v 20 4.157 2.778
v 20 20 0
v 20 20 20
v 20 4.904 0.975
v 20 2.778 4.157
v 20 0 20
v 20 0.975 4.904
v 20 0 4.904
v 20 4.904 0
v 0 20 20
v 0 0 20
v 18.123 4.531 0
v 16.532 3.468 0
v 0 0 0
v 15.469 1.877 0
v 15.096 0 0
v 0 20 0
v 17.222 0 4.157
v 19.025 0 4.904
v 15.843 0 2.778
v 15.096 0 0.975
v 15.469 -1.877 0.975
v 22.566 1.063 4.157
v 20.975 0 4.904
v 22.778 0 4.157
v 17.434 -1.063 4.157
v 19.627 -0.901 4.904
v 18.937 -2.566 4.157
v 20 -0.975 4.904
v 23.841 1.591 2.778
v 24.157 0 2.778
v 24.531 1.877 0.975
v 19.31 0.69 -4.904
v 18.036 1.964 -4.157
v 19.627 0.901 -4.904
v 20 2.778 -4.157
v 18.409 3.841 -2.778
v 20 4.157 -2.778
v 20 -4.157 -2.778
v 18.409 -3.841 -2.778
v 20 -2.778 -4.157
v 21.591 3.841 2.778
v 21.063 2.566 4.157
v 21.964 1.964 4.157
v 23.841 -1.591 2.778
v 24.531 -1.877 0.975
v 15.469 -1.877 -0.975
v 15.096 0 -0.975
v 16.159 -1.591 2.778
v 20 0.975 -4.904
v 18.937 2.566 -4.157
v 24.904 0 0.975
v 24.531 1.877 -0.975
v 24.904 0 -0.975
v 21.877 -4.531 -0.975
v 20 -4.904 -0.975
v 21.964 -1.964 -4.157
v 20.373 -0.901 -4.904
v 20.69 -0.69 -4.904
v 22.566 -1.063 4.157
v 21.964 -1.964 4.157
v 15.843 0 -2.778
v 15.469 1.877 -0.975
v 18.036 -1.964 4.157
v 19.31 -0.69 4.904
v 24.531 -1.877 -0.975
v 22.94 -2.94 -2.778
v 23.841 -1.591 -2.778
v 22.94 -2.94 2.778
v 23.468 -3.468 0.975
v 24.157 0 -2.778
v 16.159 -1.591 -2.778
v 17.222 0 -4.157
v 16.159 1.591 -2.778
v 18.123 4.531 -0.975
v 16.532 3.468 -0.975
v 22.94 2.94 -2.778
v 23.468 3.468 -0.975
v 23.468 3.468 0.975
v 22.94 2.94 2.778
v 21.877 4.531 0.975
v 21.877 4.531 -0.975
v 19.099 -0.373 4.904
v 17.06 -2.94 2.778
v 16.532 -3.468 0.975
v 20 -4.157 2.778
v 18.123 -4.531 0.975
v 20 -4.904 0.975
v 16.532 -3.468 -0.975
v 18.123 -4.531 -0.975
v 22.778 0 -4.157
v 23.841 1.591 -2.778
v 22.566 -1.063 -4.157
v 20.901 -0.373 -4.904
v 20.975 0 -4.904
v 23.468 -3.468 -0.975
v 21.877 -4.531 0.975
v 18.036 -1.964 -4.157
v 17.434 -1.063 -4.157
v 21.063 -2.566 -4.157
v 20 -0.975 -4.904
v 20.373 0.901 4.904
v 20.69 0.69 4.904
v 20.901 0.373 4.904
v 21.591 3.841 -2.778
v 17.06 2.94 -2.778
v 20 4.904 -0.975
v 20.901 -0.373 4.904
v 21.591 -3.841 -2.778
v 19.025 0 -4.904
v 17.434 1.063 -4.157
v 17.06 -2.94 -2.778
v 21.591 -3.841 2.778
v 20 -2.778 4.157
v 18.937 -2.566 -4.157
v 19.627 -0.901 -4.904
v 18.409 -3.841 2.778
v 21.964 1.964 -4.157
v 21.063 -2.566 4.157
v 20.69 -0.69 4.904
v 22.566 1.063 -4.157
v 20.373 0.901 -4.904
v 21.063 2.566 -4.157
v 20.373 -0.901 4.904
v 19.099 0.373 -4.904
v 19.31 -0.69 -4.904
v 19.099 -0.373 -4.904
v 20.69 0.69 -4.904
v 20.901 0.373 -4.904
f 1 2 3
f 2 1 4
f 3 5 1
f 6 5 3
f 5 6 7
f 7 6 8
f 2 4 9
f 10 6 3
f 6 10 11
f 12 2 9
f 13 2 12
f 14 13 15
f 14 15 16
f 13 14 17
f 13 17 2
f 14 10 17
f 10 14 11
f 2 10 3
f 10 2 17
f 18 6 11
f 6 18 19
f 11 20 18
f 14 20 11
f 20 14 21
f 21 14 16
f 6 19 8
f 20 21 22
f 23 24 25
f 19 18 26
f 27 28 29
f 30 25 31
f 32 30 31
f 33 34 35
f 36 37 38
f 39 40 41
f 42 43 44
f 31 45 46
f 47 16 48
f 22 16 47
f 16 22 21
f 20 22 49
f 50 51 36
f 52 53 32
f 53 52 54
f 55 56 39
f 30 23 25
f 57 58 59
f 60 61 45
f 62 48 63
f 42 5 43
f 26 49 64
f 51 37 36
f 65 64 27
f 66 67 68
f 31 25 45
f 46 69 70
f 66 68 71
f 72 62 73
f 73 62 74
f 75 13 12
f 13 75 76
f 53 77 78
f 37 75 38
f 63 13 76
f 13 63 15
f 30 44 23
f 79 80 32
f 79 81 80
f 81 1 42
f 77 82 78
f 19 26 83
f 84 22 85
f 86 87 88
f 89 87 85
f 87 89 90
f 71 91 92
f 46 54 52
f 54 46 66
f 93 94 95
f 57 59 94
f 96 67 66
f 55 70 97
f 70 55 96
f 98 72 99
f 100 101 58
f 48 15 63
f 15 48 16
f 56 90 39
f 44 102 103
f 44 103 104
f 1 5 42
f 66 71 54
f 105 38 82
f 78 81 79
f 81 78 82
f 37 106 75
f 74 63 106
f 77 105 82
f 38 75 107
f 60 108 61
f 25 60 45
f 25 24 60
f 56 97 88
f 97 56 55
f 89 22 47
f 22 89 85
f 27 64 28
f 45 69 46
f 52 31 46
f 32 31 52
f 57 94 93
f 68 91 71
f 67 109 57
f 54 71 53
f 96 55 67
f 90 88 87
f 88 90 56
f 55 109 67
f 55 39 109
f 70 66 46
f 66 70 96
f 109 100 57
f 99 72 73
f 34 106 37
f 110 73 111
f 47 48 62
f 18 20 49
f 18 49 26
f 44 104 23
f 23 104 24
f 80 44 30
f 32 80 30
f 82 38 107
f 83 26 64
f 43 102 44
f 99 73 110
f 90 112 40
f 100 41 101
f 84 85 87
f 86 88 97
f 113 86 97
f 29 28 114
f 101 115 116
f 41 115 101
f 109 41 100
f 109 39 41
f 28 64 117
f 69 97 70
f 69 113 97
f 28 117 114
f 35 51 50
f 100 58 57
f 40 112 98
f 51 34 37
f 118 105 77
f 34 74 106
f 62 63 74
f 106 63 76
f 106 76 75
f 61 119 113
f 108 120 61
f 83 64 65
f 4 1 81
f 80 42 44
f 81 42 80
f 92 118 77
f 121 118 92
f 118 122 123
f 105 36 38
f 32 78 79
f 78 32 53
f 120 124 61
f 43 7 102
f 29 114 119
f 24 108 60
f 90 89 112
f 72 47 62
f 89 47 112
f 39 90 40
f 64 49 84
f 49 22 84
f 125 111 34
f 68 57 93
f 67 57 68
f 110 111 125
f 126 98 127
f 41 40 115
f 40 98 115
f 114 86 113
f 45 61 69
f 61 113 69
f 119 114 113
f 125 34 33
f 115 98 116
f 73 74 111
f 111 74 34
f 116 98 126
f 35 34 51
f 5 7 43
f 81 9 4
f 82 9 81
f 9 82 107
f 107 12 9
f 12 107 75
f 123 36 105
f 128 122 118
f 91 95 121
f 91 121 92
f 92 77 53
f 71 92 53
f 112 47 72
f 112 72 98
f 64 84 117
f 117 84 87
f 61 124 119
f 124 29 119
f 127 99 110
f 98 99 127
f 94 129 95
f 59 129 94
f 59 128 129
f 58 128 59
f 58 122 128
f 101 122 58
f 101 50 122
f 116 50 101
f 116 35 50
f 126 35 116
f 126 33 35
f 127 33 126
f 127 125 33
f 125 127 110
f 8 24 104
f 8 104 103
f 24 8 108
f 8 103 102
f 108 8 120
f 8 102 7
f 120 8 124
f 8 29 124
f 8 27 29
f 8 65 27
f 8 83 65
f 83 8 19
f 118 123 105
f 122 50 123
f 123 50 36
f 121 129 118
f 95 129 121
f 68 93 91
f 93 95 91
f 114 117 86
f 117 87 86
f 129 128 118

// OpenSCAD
// Issue #100 — the reported multi-part SCAD (live repro: "Create a 20mm
// cube with a 10mm sphere sitting next to it"). The failures.jsonl archive
// line for this request carried an empty output_scad (the archive
// pre-dated the loop's SCAD capture), so this fixture IS the reported SCAD:
// the parametric W/D/H block the design prompt mandates, the cube, and the
// sphere placed beside it — the placement translate on its own line (the
// shape the gate's placement exemption must cover) and the sphere's d=10
// inlined (the 2-digit literal the gate flags when 10 is not stated).
W = 20;
D = 20;
H = 20;
cube([W, D, H]);
translate([20, 0, 0])
sphere(d = 10);
